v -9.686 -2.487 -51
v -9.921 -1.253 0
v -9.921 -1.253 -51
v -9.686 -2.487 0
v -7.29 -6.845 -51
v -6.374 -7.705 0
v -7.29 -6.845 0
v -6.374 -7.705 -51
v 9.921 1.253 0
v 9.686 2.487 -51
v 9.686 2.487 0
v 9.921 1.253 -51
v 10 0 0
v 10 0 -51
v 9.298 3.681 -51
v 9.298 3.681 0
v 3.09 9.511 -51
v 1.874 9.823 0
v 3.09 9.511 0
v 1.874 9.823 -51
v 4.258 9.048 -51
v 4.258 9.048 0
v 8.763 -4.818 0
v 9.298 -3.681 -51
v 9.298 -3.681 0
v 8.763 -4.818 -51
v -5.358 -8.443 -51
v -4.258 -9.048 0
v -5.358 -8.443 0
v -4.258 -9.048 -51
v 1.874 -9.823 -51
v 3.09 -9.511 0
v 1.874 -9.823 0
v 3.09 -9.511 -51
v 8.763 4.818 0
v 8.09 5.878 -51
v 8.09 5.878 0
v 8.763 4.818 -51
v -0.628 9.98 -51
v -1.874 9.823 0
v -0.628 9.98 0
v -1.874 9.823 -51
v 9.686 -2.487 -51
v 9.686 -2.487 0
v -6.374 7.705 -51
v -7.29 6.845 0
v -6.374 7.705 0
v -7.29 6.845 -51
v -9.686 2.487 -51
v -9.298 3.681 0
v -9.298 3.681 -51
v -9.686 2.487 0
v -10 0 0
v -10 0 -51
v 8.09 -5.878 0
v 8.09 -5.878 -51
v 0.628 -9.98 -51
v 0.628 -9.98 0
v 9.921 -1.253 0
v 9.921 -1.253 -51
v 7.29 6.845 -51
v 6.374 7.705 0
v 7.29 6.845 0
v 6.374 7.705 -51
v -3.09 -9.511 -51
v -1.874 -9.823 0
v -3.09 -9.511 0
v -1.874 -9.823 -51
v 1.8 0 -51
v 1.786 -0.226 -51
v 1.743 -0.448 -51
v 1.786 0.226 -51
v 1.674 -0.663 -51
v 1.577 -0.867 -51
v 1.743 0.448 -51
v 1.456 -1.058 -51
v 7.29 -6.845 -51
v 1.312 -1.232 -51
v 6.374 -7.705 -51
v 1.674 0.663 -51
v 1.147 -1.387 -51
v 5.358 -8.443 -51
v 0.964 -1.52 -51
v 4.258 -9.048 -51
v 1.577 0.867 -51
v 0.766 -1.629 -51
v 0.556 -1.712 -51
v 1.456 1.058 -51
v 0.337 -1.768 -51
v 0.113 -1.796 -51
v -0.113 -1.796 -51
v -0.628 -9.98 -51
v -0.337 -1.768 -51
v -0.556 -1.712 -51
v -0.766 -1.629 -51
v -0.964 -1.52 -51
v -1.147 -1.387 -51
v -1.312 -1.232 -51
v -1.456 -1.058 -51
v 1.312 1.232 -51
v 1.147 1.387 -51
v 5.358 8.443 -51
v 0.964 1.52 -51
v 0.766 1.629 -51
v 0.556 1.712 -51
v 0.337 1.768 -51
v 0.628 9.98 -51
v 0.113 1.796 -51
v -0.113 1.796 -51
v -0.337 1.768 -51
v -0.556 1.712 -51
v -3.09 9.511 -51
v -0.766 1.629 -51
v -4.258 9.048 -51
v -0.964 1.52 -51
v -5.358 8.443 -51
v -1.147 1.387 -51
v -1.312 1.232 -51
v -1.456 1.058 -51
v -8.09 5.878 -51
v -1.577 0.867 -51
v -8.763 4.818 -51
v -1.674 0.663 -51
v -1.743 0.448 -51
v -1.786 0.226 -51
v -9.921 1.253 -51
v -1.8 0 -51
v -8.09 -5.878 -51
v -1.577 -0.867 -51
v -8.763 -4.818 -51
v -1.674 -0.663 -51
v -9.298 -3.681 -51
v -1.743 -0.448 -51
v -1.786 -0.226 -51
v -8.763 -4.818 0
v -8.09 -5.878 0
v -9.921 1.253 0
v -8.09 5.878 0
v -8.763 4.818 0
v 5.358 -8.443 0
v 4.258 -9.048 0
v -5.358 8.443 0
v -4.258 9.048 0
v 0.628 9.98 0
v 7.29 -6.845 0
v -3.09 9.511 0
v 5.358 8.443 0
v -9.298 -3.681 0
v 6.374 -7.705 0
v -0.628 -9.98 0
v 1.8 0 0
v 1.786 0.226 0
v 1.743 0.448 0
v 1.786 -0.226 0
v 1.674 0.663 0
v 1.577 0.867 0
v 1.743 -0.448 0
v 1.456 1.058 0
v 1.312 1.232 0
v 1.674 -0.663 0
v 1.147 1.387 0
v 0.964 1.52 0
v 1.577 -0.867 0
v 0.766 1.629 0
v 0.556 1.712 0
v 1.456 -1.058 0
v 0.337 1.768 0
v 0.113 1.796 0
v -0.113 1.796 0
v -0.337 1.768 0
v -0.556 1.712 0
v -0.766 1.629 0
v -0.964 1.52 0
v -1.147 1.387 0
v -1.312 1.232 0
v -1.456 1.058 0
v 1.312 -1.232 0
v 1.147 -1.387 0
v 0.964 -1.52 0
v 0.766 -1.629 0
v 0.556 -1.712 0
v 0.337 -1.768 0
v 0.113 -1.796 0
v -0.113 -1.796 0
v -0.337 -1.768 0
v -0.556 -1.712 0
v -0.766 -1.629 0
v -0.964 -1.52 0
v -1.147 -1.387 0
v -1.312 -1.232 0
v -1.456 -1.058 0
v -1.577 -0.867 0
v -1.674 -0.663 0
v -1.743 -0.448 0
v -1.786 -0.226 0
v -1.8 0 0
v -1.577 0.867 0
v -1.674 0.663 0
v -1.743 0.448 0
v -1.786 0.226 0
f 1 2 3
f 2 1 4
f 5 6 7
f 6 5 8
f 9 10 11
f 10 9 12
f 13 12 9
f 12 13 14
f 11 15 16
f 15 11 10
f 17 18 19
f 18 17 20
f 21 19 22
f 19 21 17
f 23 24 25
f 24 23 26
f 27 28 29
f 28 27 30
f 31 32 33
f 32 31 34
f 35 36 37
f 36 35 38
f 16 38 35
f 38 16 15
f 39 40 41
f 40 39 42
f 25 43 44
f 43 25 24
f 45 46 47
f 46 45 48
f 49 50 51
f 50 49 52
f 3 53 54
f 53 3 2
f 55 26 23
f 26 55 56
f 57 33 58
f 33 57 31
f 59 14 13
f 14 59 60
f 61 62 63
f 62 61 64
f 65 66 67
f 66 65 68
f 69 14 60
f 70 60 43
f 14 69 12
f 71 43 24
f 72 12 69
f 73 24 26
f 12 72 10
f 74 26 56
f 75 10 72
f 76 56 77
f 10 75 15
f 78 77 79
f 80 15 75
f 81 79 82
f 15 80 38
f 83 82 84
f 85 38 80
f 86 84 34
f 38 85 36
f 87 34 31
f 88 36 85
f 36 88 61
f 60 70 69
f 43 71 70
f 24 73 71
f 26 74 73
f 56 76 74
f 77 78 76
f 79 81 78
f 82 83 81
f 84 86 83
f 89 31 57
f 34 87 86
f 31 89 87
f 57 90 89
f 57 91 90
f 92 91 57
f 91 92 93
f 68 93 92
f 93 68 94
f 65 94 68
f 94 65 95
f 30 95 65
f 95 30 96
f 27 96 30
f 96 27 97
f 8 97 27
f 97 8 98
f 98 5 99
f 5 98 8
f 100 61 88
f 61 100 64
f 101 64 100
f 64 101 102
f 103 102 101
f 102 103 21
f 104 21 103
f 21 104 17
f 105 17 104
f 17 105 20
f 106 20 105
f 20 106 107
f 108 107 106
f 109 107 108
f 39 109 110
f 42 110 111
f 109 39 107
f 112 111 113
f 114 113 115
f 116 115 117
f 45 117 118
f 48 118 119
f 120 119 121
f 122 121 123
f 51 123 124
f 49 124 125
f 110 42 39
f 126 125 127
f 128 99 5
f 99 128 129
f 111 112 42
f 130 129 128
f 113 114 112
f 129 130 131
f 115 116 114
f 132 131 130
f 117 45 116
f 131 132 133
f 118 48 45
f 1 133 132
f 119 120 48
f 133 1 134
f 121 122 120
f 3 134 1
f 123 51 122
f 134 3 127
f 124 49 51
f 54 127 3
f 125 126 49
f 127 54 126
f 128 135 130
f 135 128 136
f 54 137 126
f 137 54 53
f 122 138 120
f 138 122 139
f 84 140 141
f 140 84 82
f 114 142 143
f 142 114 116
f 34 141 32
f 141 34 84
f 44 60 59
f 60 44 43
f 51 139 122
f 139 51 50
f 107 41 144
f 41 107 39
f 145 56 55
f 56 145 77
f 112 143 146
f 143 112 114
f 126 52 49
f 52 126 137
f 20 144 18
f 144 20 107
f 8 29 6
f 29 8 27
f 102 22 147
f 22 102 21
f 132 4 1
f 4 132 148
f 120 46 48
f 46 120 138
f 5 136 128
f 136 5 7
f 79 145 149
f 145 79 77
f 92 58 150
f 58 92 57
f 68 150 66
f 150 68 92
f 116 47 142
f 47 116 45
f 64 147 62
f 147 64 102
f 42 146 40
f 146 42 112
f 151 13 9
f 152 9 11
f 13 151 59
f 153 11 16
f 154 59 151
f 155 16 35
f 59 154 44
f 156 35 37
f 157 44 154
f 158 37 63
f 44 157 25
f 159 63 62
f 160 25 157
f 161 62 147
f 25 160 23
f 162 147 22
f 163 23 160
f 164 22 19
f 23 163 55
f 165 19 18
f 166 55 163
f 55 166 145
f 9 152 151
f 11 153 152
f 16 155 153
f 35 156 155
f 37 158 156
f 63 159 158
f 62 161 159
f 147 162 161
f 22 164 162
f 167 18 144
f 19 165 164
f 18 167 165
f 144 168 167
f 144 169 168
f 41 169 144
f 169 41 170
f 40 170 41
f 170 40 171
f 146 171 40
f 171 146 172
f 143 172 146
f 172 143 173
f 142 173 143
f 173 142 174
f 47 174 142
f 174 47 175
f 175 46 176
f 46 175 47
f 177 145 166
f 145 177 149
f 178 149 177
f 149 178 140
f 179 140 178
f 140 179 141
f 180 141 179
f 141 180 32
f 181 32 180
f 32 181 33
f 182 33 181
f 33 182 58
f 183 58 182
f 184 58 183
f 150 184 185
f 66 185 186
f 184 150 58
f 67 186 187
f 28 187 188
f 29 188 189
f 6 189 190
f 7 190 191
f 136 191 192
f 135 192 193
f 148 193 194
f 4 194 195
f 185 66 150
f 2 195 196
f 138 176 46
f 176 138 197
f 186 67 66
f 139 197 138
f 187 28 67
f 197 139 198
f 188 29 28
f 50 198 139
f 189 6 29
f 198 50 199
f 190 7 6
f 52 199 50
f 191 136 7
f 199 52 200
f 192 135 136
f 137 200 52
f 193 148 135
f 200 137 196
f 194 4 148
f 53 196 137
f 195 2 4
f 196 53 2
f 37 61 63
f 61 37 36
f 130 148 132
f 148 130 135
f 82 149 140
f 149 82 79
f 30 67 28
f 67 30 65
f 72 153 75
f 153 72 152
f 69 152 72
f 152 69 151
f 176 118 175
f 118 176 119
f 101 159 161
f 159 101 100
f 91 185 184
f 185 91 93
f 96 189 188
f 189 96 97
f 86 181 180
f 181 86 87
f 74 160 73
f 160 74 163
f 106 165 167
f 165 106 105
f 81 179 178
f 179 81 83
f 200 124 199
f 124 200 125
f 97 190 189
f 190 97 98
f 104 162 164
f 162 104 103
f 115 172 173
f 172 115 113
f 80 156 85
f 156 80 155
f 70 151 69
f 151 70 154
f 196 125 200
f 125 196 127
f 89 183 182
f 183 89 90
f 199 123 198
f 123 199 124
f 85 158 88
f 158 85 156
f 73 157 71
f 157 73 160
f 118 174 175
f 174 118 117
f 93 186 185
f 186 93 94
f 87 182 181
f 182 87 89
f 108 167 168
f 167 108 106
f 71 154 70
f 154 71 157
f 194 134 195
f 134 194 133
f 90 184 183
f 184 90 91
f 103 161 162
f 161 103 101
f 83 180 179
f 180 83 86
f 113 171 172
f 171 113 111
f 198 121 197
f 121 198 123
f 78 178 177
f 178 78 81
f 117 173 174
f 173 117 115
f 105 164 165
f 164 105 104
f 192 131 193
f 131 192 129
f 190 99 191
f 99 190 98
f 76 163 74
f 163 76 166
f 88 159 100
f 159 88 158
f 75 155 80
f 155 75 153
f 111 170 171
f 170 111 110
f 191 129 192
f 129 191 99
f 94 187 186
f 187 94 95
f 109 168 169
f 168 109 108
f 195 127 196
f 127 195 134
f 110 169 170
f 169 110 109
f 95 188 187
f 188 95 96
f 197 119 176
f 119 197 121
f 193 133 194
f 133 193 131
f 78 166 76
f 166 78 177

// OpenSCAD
$fn = 50;


difference() {
	union() {
		translate(v = [0, 0, -51.0000000000]) {
			cylinder(h = 51, r = 10.0000000000);
		}
	}
	union() {
		#translate(v = [0, 0, -51]) {
			cylinder(h = 51, r = 1.8000000000);
		}
	}
}
